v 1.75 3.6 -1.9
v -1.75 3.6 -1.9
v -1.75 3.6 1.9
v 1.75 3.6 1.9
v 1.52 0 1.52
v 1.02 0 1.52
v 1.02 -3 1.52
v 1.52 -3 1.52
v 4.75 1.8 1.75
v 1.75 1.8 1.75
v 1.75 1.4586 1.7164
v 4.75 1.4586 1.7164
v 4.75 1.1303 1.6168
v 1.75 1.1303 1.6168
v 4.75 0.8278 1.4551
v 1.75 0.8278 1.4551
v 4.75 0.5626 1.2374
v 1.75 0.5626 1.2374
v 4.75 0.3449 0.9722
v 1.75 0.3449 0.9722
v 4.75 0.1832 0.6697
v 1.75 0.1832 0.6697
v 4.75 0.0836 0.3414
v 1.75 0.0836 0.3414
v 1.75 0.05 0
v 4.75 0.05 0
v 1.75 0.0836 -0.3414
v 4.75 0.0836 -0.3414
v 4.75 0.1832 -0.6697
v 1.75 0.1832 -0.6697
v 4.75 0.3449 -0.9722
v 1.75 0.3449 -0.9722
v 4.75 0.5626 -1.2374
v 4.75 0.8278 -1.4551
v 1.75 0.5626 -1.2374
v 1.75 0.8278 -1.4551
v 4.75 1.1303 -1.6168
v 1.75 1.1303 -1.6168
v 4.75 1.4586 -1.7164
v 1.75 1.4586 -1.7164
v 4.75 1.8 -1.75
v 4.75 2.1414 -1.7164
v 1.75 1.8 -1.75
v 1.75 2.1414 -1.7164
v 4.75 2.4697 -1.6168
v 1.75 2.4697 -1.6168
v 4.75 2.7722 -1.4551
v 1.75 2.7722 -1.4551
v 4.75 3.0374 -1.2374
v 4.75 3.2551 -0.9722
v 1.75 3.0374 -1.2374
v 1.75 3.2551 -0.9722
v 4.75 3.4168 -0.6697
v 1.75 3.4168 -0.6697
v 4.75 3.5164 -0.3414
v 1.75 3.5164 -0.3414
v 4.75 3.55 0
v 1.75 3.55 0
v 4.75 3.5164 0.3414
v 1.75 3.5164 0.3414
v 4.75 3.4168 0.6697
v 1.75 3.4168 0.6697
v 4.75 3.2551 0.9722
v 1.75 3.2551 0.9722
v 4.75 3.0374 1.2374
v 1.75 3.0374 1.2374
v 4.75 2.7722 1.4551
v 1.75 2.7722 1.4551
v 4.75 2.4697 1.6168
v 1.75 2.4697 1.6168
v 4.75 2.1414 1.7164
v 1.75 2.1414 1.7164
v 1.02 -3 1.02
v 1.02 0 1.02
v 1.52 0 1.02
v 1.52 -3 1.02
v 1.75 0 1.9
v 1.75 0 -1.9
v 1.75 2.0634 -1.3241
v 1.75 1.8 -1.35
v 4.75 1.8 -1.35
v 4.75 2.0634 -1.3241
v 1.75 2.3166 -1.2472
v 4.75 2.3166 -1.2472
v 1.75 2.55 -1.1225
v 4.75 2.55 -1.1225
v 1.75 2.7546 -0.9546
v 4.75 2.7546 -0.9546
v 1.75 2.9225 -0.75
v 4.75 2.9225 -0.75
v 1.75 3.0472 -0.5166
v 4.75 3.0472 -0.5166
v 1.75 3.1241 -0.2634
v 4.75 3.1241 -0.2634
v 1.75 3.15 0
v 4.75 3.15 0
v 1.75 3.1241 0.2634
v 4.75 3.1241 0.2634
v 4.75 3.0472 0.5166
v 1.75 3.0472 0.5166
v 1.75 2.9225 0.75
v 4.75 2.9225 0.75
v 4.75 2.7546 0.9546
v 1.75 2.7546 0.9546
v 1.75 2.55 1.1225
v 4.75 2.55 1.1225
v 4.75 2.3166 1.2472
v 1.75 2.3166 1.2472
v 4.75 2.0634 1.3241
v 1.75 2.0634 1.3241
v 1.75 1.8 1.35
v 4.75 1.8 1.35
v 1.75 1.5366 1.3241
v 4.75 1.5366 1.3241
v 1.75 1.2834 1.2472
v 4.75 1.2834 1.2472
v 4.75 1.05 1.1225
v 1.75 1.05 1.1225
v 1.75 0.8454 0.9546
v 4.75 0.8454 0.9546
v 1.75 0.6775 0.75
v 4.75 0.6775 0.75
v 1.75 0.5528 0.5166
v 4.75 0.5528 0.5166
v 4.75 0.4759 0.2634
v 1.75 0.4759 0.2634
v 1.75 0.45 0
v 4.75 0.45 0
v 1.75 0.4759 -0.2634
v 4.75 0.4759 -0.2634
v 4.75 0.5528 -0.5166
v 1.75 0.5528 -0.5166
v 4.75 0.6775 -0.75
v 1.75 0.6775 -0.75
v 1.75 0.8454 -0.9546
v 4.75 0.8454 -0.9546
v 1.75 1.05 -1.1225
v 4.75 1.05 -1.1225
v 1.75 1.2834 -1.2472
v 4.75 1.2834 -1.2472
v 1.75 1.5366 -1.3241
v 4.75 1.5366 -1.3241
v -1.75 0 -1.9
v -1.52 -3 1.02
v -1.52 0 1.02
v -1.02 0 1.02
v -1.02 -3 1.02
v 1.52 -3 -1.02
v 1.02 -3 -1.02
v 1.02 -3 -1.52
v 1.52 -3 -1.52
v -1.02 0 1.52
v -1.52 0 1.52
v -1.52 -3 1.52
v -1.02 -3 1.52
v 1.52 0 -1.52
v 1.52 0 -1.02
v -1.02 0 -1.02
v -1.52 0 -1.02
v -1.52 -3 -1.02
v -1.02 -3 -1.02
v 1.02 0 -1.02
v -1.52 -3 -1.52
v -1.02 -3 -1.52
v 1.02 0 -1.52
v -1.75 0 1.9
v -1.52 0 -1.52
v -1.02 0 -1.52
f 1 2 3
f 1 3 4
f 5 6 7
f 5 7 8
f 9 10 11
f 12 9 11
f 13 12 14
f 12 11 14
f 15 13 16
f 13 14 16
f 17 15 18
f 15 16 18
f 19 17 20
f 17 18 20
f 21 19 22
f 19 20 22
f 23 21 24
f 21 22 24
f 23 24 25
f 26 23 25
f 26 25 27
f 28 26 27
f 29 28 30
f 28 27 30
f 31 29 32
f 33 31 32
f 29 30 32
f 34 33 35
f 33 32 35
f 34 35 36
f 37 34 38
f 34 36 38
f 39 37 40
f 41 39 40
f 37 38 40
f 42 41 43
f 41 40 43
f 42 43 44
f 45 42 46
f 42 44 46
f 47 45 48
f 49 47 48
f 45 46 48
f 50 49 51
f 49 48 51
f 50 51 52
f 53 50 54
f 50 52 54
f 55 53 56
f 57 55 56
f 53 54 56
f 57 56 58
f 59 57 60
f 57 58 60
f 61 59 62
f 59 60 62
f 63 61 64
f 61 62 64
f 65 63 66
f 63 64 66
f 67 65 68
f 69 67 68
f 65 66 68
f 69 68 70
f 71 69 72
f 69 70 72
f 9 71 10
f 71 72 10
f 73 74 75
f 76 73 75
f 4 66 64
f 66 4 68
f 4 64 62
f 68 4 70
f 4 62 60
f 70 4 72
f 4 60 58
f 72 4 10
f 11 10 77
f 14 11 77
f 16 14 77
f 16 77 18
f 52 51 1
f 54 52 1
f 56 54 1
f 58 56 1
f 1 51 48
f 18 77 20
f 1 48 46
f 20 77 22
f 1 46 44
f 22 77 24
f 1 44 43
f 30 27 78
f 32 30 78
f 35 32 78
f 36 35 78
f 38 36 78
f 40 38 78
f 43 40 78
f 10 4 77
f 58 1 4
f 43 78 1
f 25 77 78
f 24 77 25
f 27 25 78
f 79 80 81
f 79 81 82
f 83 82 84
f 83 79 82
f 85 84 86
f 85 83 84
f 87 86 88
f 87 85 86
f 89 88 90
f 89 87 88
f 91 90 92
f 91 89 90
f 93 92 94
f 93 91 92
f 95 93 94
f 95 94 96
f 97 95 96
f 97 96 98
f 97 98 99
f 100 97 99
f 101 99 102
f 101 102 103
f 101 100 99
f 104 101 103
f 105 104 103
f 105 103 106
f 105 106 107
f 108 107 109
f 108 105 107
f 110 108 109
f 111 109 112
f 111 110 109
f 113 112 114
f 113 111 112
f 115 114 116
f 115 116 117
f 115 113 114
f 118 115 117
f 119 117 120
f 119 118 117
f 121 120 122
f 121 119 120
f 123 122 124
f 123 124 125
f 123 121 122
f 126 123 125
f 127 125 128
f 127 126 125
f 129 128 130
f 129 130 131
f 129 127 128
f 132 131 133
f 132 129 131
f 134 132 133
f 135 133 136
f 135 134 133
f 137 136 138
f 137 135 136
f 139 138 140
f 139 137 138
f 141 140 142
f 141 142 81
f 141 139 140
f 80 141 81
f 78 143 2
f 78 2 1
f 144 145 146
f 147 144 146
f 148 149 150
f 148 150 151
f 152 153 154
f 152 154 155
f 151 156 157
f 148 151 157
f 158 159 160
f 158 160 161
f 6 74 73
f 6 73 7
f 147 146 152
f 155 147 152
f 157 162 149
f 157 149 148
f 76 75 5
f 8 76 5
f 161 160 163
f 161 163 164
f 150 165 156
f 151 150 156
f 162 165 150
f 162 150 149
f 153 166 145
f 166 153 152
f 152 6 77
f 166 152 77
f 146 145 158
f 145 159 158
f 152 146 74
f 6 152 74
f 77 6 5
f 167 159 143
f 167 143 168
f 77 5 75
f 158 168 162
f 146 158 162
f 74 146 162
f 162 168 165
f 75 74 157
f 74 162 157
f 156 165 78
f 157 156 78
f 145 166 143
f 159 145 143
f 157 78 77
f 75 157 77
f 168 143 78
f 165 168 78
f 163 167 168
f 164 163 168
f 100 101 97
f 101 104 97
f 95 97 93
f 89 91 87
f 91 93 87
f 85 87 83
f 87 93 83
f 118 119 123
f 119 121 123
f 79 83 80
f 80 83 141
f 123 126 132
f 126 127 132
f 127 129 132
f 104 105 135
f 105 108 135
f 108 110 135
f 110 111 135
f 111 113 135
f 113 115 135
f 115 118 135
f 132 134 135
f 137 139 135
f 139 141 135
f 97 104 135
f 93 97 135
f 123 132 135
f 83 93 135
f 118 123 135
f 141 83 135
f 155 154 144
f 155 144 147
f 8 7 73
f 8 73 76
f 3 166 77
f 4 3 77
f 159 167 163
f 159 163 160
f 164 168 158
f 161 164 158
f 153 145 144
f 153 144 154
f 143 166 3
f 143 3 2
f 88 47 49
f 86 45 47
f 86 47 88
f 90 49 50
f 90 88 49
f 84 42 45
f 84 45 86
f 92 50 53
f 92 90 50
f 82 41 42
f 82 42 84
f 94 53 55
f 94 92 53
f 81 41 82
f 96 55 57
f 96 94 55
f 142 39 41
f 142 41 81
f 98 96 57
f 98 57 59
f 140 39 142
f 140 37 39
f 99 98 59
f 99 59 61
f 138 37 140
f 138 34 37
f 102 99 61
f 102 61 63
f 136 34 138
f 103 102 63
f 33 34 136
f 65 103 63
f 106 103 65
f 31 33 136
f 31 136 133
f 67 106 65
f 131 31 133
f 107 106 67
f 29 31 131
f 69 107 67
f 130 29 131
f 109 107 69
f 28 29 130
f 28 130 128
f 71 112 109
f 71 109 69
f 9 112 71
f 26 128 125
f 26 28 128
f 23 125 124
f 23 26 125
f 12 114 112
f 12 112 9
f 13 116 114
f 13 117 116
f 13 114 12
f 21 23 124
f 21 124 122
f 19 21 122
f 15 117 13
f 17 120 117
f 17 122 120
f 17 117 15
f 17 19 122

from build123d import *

# Parameters (mm, degrees)
SKETCH1_W           = 3.5
SKETCH1_H           = 3.8
BOSS_EXTRUDE1_DEPTH = 3.6
SKETCH2_R           = 1.75
SKETCH2_R_2         = 1.35
BOSS_EXTRUDE2_DEPTH = 3
SKETCH3_W           = 0.5
SKETCH3_H           = 0.5
BOSS_EXTRUDE3_DEPTH = 3


with BuildPart() as part:
    # Sketch1 → Boss-Extrude1 (new body)
    with BuildSketch(Plane(origin=(0, 0, 0), x_dir=(1, 0, 0), z_dir=(0, 1, 0))):
        Rectangle(SKETCH1_W, SKETCH1_H)
    extrude(amount=BOSS_EXTRUDE1_DEPTH)

    # Sketch2 → Boss-Extrude2 (add)
    with BuildSketch(Plane(origin=(1.75, 0, 0), x_dir=(0, 0, -1), z_dir=(1, 0, 0))):
        with Locations(Location((0, 1.8, 0), (0, 0, 180))):
            Circle(SKETCH2_R)
        with Locations((0, 1.8)):
            Circle(SKETCH2_R_2, mode=Mode.SUBTRACT)
    extrude(amount=BOSS_EXTRUDE2_DEPTH)

    # Sketch3 → Boss-Extrude3 (add)
    with BuildSketch(Plane.XZ):
        with Locations((-1.27, 1.27)):
            Rectangle(SKETCH3_W, SKETCH3_H)
        with Locations((-1.27, -1.27)):
            Rectangle(SKETCH3_W, SKETCH3_H)
        with Locations((1.27, 1.27)):
            Rectangle(SKETCH3_W, SKETCH3_H)
        with Locations((1.27, -1.27)):
            Rectangle(SKETCH3_W, SKETCH3_H)
    extrude(amount=BOSS_EXTRUDE3_DEPTH)


solid = part.part
